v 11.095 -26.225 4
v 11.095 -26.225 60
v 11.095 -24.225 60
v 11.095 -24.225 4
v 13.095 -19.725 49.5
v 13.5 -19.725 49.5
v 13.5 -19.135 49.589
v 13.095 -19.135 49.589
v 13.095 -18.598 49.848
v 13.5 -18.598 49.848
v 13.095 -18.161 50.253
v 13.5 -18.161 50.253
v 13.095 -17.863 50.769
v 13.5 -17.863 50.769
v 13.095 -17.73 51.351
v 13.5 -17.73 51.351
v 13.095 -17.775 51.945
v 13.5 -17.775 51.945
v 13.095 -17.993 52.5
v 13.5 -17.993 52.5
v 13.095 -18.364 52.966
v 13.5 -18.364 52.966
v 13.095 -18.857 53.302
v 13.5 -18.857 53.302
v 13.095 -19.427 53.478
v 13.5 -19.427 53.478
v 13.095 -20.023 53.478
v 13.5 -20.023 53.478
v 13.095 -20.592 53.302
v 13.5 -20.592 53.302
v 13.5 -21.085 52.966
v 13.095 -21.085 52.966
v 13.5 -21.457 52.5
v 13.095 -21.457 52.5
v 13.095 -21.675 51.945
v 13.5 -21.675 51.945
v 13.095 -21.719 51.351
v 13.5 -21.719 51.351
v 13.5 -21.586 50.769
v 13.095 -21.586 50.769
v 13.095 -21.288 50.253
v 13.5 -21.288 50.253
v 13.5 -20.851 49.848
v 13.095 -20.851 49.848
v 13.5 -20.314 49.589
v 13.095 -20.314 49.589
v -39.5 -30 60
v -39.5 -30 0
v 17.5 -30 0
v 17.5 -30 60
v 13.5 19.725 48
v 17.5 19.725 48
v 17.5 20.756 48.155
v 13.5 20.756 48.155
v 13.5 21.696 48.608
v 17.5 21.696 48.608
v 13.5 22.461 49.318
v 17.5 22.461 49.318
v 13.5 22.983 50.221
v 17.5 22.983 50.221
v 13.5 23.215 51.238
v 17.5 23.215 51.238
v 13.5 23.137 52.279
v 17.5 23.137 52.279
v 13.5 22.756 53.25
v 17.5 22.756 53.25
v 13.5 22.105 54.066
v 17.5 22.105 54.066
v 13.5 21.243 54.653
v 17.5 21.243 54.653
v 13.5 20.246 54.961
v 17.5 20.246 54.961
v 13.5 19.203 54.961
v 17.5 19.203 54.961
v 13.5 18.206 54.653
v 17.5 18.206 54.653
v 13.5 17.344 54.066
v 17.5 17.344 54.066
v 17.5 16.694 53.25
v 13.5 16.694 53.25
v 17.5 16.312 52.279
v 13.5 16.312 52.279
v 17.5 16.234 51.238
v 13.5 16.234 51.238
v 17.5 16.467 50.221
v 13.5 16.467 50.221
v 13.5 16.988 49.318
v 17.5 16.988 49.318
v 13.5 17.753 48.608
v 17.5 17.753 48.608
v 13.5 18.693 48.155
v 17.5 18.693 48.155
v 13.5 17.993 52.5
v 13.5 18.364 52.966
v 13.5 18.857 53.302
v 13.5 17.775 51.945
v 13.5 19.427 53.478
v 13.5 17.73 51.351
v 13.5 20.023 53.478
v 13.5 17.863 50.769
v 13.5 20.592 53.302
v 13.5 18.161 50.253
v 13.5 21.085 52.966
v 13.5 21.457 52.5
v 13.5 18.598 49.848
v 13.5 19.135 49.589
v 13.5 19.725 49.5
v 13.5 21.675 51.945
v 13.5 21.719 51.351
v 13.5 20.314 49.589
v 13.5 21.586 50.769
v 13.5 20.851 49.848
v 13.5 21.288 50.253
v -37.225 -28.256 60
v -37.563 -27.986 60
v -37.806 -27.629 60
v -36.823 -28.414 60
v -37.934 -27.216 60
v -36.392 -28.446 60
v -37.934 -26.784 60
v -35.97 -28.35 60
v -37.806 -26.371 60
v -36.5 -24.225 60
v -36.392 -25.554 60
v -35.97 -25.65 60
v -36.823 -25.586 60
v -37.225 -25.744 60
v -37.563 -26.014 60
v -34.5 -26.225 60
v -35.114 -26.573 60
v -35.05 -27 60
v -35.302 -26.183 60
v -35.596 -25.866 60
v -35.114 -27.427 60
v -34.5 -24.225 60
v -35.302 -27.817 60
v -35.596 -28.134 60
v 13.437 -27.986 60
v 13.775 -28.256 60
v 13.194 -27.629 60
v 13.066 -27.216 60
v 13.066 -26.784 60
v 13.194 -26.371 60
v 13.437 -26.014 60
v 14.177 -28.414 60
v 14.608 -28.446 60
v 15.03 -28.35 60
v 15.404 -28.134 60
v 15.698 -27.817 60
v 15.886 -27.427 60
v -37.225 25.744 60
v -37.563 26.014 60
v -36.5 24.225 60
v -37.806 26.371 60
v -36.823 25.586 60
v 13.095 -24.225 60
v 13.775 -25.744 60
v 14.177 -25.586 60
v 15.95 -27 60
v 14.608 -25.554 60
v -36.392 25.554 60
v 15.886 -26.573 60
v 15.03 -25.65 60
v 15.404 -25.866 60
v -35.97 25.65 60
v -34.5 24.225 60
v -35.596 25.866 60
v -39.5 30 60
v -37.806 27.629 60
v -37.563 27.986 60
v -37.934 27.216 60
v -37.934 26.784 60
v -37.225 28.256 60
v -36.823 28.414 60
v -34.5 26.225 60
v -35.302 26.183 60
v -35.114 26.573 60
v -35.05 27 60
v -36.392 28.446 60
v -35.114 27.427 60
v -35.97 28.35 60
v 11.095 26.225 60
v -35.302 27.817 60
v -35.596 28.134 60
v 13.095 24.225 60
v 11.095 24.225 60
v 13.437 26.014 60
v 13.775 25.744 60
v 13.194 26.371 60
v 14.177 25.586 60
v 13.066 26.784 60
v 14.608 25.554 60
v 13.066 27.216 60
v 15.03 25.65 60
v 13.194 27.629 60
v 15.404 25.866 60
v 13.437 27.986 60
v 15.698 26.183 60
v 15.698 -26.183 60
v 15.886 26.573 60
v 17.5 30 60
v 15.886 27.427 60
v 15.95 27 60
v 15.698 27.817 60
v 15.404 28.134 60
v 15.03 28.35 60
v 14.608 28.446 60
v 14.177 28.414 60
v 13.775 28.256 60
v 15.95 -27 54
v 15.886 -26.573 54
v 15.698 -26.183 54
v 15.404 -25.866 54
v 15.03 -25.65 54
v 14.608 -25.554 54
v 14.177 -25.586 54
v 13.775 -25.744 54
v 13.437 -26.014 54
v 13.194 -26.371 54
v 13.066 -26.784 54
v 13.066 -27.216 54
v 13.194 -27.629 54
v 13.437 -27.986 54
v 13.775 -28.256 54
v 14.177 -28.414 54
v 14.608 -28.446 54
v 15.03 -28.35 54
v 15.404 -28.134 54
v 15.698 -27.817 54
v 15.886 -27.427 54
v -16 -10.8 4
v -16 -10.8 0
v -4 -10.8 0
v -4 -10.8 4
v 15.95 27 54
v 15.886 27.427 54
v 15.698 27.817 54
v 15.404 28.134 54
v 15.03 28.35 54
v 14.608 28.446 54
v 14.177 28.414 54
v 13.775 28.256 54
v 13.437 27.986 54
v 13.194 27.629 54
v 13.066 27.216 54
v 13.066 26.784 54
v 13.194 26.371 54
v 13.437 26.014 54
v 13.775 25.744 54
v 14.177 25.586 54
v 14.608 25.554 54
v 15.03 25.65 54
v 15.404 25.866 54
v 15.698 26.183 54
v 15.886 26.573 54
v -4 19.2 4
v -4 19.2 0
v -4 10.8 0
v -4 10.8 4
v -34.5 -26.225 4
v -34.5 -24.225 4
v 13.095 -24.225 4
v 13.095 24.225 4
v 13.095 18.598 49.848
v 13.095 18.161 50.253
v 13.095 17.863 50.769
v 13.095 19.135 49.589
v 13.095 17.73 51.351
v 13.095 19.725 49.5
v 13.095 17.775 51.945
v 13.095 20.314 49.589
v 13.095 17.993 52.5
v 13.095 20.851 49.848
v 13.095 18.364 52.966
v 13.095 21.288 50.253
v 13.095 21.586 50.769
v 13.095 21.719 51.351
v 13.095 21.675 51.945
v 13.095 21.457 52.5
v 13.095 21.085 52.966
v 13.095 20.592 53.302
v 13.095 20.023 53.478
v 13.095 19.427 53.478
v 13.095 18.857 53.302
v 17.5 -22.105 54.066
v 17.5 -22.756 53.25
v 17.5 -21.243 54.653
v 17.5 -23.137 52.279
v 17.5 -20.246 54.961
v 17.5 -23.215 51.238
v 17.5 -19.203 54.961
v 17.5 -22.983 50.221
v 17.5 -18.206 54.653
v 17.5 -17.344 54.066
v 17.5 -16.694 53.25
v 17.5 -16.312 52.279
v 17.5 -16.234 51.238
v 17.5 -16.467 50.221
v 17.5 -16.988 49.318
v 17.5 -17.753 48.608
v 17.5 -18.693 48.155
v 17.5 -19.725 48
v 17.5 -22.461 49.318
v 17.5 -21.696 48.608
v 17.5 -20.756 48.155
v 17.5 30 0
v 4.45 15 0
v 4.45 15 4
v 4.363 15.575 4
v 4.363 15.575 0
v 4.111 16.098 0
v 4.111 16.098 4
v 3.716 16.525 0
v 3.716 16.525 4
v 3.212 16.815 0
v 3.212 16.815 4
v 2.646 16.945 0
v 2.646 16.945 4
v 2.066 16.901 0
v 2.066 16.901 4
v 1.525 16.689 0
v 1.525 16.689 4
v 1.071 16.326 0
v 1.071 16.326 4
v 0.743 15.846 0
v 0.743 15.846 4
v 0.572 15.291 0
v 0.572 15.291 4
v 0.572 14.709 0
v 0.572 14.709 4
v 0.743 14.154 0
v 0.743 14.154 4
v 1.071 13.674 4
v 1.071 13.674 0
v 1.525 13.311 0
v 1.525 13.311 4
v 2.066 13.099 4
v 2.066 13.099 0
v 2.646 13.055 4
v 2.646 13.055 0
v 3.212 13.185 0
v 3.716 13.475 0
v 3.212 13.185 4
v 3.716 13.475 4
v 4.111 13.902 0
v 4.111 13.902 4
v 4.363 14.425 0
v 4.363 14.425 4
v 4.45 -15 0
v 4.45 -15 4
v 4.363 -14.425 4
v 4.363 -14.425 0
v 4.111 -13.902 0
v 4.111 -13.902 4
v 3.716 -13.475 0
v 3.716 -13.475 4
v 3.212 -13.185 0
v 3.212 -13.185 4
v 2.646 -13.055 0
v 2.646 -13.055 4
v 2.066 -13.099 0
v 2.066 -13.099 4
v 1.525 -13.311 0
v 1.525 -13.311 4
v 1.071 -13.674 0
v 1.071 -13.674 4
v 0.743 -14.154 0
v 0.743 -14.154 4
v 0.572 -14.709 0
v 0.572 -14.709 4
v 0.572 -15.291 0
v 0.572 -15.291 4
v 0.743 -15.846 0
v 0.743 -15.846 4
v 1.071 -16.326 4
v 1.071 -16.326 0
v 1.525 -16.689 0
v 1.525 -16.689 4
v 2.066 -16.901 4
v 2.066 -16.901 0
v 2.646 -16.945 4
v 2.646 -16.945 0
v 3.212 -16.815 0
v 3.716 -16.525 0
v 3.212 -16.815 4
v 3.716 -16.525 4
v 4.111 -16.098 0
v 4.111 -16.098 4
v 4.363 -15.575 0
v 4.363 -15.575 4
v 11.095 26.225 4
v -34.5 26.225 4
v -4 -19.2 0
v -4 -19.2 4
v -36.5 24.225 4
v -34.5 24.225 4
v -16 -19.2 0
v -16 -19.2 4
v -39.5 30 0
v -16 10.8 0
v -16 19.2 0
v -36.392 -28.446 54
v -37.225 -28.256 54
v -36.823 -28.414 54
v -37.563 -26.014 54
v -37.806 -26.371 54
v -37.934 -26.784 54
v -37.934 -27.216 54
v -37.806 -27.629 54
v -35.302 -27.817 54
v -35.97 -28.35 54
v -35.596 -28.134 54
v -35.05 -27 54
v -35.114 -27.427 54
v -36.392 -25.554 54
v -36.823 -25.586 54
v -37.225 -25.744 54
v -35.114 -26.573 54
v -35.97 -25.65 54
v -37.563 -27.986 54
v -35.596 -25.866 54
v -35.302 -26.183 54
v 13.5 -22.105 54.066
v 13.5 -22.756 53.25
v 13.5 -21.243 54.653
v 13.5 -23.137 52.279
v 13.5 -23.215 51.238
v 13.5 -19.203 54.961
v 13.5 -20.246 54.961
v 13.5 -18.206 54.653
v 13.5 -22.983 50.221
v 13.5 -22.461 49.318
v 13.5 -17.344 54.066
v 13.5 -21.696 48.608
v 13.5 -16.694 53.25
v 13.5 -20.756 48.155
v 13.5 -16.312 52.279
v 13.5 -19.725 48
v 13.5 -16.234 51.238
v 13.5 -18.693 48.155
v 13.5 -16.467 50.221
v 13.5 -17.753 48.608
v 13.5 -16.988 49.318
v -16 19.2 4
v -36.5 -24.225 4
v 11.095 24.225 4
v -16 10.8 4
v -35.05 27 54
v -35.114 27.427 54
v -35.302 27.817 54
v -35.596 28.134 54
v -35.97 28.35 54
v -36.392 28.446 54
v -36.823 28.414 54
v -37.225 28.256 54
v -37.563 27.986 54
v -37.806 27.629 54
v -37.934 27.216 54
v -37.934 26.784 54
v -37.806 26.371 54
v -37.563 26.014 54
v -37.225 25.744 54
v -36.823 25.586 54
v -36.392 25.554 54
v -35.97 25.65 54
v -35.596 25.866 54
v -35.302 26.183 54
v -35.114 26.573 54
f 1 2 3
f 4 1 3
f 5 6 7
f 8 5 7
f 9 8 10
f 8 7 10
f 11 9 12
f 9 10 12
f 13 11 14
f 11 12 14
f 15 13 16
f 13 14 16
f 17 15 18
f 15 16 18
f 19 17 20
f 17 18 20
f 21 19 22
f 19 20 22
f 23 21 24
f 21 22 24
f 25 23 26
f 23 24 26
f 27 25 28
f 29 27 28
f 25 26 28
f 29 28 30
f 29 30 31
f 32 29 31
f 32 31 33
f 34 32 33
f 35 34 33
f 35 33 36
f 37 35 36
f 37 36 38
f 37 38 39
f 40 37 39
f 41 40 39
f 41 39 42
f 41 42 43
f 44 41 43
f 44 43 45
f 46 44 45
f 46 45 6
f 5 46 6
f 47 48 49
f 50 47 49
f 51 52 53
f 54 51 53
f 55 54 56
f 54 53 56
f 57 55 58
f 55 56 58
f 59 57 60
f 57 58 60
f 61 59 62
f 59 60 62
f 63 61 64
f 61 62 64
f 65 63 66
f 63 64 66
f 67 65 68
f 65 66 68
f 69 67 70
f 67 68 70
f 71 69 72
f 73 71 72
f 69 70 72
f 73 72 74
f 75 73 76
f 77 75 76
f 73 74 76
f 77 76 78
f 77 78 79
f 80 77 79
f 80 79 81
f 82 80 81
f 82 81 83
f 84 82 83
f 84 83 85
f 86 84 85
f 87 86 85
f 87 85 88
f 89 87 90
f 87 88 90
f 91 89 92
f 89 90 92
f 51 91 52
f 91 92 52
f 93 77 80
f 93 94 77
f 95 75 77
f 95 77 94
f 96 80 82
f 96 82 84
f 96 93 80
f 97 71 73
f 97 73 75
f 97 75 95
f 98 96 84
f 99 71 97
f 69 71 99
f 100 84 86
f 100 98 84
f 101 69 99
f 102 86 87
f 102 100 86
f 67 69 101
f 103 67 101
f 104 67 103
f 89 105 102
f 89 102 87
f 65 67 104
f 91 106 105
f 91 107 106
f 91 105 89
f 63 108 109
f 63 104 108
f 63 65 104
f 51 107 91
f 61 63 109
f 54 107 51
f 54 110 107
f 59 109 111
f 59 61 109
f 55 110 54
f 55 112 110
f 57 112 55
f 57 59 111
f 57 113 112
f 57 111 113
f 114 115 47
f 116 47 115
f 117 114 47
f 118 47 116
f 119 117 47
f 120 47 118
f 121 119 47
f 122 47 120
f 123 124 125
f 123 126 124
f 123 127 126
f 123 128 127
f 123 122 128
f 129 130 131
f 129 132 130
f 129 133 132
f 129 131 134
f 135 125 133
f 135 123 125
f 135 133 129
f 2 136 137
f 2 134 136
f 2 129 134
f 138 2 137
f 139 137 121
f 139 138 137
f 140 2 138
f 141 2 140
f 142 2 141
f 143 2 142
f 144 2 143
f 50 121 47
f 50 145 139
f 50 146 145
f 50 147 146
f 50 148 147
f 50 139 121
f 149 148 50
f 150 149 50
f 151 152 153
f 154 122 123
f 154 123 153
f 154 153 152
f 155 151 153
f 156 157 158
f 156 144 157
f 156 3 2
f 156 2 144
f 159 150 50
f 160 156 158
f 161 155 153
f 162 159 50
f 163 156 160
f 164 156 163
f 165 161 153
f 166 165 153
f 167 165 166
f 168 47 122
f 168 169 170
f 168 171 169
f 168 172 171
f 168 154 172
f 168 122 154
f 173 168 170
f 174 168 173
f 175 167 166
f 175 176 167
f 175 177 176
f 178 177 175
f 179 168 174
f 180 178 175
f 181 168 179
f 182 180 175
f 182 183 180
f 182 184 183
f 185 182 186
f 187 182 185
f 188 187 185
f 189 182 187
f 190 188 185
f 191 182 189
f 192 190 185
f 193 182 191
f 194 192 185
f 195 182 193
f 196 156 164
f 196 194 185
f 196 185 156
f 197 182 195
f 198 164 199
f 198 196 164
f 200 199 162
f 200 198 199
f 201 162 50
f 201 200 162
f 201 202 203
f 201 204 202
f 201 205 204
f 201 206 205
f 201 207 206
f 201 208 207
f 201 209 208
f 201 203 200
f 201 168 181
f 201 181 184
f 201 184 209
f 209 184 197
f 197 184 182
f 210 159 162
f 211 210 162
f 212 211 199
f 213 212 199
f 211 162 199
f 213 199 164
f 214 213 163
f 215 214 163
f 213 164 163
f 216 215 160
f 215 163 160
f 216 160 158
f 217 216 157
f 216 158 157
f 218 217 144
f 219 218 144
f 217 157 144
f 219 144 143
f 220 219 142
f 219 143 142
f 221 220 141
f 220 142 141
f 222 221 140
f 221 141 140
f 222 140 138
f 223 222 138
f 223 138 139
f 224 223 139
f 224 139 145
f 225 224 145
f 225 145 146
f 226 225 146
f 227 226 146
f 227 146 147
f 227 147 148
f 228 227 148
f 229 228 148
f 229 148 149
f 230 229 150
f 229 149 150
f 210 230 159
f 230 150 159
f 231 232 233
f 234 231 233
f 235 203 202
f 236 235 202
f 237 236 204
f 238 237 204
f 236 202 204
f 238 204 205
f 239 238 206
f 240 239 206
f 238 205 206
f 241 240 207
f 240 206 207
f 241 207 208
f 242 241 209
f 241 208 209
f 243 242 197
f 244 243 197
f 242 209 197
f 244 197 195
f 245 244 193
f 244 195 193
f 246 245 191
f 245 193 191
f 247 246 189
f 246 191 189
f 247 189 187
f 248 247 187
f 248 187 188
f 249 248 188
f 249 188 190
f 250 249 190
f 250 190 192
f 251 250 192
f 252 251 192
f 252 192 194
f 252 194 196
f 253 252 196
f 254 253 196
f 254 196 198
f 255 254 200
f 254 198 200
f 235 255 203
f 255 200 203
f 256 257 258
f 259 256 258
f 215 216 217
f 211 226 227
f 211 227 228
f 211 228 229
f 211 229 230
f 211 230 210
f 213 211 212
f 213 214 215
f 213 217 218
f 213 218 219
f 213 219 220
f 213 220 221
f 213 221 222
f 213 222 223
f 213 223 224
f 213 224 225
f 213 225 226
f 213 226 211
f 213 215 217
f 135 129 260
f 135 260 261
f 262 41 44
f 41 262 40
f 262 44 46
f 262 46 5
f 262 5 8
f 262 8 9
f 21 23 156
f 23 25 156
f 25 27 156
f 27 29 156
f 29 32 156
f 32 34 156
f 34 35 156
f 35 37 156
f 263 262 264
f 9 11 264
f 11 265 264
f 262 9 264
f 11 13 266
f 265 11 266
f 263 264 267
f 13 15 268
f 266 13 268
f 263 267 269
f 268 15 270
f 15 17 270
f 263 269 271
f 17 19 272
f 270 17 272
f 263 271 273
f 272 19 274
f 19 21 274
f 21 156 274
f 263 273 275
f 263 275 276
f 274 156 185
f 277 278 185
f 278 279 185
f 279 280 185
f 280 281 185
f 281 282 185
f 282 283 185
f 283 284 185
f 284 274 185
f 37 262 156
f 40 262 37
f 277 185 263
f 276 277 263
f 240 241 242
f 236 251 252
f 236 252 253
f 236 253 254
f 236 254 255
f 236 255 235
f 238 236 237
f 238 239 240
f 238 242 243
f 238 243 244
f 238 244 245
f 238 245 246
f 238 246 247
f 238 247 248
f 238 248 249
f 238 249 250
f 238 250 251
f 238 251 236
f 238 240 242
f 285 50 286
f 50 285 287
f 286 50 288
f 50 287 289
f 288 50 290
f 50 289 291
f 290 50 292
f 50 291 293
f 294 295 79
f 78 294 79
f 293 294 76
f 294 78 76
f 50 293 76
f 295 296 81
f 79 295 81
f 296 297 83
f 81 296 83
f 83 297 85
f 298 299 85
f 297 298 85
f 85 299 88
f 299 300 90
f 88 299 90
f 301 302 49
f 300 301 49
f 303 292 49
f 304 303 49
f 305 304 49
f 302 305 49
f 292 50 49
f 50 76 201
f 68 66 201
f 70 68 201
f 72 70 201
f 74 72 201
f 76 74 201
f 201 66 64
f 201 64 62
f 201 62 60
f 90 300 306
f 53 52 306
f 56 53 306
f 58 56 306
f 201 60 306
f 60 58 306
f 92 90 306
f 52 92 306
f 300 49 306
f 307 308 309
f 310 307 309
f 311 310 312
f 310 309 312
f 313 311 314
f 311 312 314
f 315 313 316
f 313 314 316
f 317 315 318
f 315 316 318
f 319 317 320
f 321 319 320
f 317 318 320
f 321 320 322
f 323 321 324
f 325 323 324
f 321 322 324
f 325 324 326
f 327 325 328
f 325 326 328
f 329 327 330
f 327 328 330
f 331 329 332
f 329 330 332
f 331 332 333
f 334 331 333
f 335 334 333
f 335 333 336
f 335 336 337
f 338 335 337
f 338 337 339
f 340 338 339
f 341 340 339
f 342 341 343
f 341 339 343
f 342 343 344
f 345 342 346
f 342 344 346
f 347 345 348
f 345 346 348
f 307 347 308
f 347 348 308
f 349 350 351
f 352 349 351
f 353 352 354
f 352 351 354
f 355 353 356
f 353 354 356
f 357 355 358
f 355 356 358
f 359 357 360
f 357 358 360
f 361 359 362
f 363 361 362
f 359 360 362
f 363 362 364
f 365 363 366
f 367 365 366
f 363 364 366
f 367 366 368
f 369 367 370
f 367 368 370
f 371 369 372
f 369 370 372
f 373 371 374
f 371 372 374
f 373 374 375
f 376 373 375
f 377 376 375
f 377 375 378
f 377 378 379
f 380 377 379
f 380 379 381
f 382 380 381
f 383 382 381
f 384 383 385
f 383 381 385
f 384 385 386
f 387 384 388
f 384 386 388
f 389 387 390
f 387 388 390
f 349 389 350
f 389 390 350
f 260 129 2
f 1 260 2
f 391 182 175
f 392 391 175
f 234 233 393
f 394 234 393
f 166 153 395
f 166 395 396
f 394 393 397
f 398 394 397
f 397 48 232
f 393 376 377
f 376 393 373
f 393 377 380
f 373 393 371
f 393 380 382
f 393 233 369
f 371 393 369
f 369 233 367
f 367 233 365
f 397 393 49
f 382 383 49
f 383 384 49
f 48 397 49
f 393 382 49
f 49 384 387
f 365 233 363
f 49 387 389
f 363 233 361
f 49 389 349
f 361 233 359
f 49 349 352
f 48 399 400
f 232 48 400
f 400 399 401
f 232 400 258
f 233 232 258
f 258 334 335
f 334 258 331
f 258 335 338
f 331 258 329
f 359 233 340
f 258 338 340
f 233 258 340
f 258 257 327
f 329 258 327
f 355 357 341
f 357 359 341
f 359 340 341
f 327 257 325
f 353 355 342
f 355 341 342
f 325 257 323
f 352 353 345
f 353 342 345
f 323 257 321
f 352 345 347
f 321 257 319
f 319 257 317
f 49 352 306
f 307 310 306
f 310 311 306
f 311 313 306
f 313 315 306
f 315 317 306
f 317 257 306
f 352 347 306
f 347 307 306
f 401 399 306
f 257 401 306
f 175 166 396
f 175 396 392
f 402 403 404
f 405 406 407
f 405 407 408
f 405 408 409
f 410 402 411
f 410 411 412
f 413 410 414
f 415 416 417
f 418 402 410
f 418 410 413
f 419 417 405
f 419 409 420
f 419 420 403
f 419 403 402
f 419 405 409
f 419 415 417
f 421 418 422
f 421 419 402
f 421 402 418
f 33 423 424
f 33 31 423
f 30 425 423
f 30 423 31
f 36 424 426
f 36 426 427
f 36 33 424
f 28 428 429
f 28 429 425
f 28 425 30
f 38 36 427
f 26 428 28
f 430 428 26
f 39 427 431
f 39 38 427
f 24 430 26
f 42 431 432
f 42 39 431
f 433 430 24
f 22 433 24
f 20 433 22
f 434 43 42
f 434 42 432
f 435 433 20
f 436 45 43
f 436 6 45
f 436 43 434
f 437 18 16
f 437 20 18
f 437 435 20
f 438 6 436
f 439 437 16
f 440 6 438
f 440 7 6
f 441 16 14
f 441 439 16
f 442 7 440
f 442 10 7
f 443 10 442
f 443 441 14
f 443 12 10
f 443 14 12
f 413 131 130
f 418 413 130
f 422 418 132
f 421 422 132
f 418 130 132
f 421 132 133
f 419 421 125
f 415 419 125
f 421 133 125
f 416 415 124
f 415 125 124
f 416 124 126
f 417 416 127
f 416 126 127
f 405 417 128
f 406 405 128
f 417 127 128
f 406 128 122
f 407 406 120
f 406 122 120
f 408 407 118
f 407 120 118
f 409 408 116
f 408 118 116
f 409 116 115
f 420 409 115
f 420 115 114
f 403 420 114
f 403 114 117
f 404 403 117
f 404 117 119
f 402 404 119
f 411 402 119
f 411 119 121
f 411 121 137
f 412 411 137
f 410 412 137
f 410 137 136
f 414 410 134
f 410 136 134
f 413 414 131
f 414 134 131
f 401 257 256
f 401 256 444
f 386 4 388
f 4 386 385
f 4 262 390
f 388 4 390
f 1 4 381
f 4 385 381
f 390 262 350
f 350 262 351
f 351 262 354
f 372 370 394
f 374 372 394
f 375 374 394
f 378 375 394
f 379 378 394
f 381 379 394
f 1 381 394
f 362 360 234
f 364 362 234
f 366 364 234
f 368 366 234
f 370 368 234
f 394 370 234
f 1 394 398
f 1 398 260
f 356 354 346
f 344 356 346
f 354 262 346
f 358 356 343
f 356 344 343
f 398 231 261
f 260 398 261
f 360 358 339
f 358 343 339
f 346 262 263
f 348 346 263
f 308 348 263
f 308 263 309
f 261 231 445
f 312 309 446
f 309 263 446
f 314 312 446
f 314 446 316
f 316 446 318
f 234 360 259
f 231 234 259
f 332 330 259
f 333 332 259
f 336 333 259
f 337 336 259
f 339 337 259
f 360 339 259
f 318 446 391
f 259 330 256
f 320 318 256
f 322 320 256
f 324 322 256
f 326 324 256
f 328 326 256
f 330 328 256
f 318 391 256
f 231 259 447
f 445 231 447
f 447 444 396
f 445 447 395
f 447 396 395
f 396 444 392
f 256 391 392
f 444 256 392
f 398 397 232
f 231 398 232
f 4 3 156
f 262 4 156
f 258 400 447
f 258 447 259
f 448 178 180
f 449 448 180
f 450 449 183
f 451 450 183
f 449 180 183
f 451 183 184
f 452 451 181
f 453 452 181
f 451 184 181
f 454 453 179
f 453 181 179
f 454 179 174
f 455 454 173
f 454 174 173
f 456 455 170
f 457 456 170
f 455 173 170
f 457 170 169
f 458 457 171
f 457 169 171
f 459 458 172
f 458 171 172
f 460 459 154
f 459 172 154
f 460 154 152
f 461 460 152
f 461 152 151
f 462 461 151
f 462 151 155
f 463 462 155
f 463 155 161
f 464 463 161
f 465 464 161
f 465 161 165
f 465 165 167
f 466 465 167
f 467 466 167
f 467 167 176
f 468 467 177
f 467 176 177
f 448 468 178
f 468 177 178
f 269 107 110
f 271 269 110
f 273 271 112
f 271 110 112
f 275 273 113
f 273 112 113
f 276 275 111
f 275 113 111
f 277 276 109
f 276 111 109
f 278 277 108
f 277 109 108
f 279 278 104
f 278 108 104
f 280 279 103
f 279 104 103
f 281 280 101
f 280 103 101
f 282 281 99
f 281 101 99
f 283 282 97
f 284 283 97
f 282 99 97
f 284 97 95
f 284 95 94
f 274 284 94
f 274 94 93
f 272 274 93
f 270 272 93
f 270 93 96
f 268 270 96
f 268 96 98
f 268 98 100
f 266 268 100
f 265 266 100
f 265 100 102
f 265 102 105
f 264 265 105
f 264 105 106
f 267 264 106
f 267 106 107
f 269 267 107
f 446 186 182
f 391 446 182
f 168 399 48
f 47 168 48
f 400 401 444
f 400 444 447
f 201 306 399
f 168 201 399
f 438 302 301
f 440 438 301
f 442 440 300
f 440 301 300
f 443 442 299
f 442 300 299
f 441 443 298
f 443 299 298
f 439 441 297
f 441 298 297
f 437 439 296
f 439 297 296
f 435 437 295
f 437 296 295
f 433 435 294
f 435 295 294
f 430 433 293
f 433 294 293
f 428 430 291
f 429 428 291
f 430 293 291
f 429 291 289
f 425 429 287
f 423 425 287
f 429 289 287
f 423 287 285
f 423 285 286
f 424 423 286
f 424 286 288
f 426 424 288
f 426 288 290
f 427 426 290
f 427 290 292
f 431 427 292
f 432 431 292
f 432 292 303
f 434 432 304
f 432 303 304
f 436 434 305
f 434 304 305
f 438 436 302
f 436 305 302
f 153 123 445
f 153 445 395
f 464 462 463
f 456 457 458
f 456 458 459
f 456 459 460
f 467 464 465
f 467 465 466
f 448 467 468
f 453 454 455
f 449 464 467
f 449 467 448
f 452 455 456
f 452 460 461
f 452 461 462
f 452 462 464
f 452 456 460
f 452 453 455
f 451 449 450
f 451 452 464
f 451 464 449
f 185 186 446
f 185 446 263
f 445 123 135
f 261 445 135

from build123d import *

# Parameters (mm, degrees)
BOSS_EXTRUDE1_DEPTH = 60
CUT_EXTRUDE1_DEPTH  = 56
CUT_EXTRUDE2_DEPTH  = 61
SKETCH9_R           = 3.5
CUT_EXTRUDE3_DEPTH  = 4
SKETCH12_W          = 2
SKETCH12_H          = 2
BOSS_EXTRUDE3_DEPTH = 56
SKETCH13_R          = 1.45
CUT_EXTRUDE5_DEPTH  = 6
SKETCH16_R          = 1.95
CUT_EXTRUDE6_DEPTH  = 4
SKETCH17_R          = 2
CUT_EXTRUDE7_DEPTH  = 4.404613


with BuildPart() as part:
    # Sketch1 → Boss-Extrude1 (new body)
    with BuildSketch(Plane.XY):
        Polygon((-17.5, 30), (-27.5, 30), (-39.5, 30), (-39.5, -30), (-27.5, -30), (-17.5, -30), (17.5, -30), (17.5, 30), align=None)
    extrude(amount=BOSS_EXTRUDE1_DEPTH)

    # Sketch3 → Cut-Extrude1 (cut)
    with BuildSketch(Plane.XY.offset(60)):
        Polygon((-13.09538708, -26.224688329), (-23.1, -26.224688329), (-36.5, -26.224688329), (-36.5, 26.224688329), (-23.1, 26.224688329), (-13.09538708, 26.224688329), (11.09538708, 26.224688329), (13.09538708, 26.224688329), (13.09538708, 0), (13.09538708, -26.224688329), (11.09538708, -26.224688329), align=None)
    extrude(amount=-CUT_EXTRUDE1_DEPTH, mode=Mode.SUBTRACT)

    # Sketch6 → Cut-Extrude2 (cut, through all)
    with BuildSketch(Plane(origin=(0, 0, 0), x_dir=(-1, 0, 0), z_dir=(0, 0, -1))):
        Polygon((4, 15), (4, 19.2), (16, 19.2), (16, 10.8), (4, 10.8), align=None)
        Polygon((16, -10.8), (4, -10.8), (4, -15), (4, -19.2), (16, -19.2), align=None)
    extrude(amount=-CUT_EXTRUDE2_DEPTH, mode=Mode.SUBTRACT)

    # Sketch9 → Cut-Extrude3 (cut)
    with BuildSketch(Plane(origin=(17.5, 0, 0), x_dir=(0, 0, -1), z_dir=(1, 0, 0))):
        with Locations((-51.5, 19.72468833)):
            Circle(SKETCH9_R)
        with Locations((-51.5, -19.72468833)):
            Circle(SKETCH9_R)
    extrude(amount=-CUT_EXTRUDE3_DEPTH, mode=Mode.SUBTRACT)

    # Sketch12 → Boss-Extrude3 (add)
    with BuildSketch(Plane.XY.offset(60)):
        with Locations((-35.5, 25.224688329)):
            Rectangle(SKETCH12_W, SKETCH12_H)
        with Locations((12.09538708, -25.224688329)):
            Rectangle(SKETCH12_W, SKETCH12_H)
        with Locations((12.09538708, 25.224688329)):
            Rectangle(SKETCH12_W, SKETCH12_H)
        with Locations((-35.5, -25.224688329)):
            Rectangle(SKETCH12_W, SKETCH12_H)
    extrude(amount=-BOSS_EXTRUDE3_DEPTH)

    # Sketch13 → Cut-Extrude5 (cut)
    with BuildSketch(Plane.XY.offset(60)):
        with Locations((-36.5, 27)):
            Circle(SKETCH13_R)
        with Locations((-36.5, -27)):
            Circle(SKETCH13_R)
        with Locations((14.5, 27)):
            Circle(SKETCH13_R)
        with Locations((14.5, -27)):
            Circle(SKETCH13_R)
    extrude(amount=-CUT_EXTRUDE5_DEPTH, mode=Mode.SUBTRACT)

    # Sketch16 → Cut-Extrude6 (cut)
    with BuildSketch(Plane.XY.offset(4)):
        with Locations((2.5, 15)):
            Circle(SKETCH16_R)
        with Locations((2.5, -15)):
            Circle(SKETCH16_R)
    extrude(amount=-CUT_EXTRUDE6_DEPTH, mode=Mode.SUBTRACT)

    # Sketch17 → Cut-Extrude7 (cut)
    with BuildSketch(Plane(origin=(17.5, 0, 0), x_dir=(0, 0, -1), z_dir=(1, 0, 0))):
        with Locations((-51.5, 19.72468833)):
            Circle(SKETCH17_R)
        with Locations((-51.5, -19.72468833)):
            Circle(SKETCH17_R)
    extrude(amount=-CUT_EXTRUDE7_DEPTH, mode=Mode.SUBTRACT)


solid = part.part
